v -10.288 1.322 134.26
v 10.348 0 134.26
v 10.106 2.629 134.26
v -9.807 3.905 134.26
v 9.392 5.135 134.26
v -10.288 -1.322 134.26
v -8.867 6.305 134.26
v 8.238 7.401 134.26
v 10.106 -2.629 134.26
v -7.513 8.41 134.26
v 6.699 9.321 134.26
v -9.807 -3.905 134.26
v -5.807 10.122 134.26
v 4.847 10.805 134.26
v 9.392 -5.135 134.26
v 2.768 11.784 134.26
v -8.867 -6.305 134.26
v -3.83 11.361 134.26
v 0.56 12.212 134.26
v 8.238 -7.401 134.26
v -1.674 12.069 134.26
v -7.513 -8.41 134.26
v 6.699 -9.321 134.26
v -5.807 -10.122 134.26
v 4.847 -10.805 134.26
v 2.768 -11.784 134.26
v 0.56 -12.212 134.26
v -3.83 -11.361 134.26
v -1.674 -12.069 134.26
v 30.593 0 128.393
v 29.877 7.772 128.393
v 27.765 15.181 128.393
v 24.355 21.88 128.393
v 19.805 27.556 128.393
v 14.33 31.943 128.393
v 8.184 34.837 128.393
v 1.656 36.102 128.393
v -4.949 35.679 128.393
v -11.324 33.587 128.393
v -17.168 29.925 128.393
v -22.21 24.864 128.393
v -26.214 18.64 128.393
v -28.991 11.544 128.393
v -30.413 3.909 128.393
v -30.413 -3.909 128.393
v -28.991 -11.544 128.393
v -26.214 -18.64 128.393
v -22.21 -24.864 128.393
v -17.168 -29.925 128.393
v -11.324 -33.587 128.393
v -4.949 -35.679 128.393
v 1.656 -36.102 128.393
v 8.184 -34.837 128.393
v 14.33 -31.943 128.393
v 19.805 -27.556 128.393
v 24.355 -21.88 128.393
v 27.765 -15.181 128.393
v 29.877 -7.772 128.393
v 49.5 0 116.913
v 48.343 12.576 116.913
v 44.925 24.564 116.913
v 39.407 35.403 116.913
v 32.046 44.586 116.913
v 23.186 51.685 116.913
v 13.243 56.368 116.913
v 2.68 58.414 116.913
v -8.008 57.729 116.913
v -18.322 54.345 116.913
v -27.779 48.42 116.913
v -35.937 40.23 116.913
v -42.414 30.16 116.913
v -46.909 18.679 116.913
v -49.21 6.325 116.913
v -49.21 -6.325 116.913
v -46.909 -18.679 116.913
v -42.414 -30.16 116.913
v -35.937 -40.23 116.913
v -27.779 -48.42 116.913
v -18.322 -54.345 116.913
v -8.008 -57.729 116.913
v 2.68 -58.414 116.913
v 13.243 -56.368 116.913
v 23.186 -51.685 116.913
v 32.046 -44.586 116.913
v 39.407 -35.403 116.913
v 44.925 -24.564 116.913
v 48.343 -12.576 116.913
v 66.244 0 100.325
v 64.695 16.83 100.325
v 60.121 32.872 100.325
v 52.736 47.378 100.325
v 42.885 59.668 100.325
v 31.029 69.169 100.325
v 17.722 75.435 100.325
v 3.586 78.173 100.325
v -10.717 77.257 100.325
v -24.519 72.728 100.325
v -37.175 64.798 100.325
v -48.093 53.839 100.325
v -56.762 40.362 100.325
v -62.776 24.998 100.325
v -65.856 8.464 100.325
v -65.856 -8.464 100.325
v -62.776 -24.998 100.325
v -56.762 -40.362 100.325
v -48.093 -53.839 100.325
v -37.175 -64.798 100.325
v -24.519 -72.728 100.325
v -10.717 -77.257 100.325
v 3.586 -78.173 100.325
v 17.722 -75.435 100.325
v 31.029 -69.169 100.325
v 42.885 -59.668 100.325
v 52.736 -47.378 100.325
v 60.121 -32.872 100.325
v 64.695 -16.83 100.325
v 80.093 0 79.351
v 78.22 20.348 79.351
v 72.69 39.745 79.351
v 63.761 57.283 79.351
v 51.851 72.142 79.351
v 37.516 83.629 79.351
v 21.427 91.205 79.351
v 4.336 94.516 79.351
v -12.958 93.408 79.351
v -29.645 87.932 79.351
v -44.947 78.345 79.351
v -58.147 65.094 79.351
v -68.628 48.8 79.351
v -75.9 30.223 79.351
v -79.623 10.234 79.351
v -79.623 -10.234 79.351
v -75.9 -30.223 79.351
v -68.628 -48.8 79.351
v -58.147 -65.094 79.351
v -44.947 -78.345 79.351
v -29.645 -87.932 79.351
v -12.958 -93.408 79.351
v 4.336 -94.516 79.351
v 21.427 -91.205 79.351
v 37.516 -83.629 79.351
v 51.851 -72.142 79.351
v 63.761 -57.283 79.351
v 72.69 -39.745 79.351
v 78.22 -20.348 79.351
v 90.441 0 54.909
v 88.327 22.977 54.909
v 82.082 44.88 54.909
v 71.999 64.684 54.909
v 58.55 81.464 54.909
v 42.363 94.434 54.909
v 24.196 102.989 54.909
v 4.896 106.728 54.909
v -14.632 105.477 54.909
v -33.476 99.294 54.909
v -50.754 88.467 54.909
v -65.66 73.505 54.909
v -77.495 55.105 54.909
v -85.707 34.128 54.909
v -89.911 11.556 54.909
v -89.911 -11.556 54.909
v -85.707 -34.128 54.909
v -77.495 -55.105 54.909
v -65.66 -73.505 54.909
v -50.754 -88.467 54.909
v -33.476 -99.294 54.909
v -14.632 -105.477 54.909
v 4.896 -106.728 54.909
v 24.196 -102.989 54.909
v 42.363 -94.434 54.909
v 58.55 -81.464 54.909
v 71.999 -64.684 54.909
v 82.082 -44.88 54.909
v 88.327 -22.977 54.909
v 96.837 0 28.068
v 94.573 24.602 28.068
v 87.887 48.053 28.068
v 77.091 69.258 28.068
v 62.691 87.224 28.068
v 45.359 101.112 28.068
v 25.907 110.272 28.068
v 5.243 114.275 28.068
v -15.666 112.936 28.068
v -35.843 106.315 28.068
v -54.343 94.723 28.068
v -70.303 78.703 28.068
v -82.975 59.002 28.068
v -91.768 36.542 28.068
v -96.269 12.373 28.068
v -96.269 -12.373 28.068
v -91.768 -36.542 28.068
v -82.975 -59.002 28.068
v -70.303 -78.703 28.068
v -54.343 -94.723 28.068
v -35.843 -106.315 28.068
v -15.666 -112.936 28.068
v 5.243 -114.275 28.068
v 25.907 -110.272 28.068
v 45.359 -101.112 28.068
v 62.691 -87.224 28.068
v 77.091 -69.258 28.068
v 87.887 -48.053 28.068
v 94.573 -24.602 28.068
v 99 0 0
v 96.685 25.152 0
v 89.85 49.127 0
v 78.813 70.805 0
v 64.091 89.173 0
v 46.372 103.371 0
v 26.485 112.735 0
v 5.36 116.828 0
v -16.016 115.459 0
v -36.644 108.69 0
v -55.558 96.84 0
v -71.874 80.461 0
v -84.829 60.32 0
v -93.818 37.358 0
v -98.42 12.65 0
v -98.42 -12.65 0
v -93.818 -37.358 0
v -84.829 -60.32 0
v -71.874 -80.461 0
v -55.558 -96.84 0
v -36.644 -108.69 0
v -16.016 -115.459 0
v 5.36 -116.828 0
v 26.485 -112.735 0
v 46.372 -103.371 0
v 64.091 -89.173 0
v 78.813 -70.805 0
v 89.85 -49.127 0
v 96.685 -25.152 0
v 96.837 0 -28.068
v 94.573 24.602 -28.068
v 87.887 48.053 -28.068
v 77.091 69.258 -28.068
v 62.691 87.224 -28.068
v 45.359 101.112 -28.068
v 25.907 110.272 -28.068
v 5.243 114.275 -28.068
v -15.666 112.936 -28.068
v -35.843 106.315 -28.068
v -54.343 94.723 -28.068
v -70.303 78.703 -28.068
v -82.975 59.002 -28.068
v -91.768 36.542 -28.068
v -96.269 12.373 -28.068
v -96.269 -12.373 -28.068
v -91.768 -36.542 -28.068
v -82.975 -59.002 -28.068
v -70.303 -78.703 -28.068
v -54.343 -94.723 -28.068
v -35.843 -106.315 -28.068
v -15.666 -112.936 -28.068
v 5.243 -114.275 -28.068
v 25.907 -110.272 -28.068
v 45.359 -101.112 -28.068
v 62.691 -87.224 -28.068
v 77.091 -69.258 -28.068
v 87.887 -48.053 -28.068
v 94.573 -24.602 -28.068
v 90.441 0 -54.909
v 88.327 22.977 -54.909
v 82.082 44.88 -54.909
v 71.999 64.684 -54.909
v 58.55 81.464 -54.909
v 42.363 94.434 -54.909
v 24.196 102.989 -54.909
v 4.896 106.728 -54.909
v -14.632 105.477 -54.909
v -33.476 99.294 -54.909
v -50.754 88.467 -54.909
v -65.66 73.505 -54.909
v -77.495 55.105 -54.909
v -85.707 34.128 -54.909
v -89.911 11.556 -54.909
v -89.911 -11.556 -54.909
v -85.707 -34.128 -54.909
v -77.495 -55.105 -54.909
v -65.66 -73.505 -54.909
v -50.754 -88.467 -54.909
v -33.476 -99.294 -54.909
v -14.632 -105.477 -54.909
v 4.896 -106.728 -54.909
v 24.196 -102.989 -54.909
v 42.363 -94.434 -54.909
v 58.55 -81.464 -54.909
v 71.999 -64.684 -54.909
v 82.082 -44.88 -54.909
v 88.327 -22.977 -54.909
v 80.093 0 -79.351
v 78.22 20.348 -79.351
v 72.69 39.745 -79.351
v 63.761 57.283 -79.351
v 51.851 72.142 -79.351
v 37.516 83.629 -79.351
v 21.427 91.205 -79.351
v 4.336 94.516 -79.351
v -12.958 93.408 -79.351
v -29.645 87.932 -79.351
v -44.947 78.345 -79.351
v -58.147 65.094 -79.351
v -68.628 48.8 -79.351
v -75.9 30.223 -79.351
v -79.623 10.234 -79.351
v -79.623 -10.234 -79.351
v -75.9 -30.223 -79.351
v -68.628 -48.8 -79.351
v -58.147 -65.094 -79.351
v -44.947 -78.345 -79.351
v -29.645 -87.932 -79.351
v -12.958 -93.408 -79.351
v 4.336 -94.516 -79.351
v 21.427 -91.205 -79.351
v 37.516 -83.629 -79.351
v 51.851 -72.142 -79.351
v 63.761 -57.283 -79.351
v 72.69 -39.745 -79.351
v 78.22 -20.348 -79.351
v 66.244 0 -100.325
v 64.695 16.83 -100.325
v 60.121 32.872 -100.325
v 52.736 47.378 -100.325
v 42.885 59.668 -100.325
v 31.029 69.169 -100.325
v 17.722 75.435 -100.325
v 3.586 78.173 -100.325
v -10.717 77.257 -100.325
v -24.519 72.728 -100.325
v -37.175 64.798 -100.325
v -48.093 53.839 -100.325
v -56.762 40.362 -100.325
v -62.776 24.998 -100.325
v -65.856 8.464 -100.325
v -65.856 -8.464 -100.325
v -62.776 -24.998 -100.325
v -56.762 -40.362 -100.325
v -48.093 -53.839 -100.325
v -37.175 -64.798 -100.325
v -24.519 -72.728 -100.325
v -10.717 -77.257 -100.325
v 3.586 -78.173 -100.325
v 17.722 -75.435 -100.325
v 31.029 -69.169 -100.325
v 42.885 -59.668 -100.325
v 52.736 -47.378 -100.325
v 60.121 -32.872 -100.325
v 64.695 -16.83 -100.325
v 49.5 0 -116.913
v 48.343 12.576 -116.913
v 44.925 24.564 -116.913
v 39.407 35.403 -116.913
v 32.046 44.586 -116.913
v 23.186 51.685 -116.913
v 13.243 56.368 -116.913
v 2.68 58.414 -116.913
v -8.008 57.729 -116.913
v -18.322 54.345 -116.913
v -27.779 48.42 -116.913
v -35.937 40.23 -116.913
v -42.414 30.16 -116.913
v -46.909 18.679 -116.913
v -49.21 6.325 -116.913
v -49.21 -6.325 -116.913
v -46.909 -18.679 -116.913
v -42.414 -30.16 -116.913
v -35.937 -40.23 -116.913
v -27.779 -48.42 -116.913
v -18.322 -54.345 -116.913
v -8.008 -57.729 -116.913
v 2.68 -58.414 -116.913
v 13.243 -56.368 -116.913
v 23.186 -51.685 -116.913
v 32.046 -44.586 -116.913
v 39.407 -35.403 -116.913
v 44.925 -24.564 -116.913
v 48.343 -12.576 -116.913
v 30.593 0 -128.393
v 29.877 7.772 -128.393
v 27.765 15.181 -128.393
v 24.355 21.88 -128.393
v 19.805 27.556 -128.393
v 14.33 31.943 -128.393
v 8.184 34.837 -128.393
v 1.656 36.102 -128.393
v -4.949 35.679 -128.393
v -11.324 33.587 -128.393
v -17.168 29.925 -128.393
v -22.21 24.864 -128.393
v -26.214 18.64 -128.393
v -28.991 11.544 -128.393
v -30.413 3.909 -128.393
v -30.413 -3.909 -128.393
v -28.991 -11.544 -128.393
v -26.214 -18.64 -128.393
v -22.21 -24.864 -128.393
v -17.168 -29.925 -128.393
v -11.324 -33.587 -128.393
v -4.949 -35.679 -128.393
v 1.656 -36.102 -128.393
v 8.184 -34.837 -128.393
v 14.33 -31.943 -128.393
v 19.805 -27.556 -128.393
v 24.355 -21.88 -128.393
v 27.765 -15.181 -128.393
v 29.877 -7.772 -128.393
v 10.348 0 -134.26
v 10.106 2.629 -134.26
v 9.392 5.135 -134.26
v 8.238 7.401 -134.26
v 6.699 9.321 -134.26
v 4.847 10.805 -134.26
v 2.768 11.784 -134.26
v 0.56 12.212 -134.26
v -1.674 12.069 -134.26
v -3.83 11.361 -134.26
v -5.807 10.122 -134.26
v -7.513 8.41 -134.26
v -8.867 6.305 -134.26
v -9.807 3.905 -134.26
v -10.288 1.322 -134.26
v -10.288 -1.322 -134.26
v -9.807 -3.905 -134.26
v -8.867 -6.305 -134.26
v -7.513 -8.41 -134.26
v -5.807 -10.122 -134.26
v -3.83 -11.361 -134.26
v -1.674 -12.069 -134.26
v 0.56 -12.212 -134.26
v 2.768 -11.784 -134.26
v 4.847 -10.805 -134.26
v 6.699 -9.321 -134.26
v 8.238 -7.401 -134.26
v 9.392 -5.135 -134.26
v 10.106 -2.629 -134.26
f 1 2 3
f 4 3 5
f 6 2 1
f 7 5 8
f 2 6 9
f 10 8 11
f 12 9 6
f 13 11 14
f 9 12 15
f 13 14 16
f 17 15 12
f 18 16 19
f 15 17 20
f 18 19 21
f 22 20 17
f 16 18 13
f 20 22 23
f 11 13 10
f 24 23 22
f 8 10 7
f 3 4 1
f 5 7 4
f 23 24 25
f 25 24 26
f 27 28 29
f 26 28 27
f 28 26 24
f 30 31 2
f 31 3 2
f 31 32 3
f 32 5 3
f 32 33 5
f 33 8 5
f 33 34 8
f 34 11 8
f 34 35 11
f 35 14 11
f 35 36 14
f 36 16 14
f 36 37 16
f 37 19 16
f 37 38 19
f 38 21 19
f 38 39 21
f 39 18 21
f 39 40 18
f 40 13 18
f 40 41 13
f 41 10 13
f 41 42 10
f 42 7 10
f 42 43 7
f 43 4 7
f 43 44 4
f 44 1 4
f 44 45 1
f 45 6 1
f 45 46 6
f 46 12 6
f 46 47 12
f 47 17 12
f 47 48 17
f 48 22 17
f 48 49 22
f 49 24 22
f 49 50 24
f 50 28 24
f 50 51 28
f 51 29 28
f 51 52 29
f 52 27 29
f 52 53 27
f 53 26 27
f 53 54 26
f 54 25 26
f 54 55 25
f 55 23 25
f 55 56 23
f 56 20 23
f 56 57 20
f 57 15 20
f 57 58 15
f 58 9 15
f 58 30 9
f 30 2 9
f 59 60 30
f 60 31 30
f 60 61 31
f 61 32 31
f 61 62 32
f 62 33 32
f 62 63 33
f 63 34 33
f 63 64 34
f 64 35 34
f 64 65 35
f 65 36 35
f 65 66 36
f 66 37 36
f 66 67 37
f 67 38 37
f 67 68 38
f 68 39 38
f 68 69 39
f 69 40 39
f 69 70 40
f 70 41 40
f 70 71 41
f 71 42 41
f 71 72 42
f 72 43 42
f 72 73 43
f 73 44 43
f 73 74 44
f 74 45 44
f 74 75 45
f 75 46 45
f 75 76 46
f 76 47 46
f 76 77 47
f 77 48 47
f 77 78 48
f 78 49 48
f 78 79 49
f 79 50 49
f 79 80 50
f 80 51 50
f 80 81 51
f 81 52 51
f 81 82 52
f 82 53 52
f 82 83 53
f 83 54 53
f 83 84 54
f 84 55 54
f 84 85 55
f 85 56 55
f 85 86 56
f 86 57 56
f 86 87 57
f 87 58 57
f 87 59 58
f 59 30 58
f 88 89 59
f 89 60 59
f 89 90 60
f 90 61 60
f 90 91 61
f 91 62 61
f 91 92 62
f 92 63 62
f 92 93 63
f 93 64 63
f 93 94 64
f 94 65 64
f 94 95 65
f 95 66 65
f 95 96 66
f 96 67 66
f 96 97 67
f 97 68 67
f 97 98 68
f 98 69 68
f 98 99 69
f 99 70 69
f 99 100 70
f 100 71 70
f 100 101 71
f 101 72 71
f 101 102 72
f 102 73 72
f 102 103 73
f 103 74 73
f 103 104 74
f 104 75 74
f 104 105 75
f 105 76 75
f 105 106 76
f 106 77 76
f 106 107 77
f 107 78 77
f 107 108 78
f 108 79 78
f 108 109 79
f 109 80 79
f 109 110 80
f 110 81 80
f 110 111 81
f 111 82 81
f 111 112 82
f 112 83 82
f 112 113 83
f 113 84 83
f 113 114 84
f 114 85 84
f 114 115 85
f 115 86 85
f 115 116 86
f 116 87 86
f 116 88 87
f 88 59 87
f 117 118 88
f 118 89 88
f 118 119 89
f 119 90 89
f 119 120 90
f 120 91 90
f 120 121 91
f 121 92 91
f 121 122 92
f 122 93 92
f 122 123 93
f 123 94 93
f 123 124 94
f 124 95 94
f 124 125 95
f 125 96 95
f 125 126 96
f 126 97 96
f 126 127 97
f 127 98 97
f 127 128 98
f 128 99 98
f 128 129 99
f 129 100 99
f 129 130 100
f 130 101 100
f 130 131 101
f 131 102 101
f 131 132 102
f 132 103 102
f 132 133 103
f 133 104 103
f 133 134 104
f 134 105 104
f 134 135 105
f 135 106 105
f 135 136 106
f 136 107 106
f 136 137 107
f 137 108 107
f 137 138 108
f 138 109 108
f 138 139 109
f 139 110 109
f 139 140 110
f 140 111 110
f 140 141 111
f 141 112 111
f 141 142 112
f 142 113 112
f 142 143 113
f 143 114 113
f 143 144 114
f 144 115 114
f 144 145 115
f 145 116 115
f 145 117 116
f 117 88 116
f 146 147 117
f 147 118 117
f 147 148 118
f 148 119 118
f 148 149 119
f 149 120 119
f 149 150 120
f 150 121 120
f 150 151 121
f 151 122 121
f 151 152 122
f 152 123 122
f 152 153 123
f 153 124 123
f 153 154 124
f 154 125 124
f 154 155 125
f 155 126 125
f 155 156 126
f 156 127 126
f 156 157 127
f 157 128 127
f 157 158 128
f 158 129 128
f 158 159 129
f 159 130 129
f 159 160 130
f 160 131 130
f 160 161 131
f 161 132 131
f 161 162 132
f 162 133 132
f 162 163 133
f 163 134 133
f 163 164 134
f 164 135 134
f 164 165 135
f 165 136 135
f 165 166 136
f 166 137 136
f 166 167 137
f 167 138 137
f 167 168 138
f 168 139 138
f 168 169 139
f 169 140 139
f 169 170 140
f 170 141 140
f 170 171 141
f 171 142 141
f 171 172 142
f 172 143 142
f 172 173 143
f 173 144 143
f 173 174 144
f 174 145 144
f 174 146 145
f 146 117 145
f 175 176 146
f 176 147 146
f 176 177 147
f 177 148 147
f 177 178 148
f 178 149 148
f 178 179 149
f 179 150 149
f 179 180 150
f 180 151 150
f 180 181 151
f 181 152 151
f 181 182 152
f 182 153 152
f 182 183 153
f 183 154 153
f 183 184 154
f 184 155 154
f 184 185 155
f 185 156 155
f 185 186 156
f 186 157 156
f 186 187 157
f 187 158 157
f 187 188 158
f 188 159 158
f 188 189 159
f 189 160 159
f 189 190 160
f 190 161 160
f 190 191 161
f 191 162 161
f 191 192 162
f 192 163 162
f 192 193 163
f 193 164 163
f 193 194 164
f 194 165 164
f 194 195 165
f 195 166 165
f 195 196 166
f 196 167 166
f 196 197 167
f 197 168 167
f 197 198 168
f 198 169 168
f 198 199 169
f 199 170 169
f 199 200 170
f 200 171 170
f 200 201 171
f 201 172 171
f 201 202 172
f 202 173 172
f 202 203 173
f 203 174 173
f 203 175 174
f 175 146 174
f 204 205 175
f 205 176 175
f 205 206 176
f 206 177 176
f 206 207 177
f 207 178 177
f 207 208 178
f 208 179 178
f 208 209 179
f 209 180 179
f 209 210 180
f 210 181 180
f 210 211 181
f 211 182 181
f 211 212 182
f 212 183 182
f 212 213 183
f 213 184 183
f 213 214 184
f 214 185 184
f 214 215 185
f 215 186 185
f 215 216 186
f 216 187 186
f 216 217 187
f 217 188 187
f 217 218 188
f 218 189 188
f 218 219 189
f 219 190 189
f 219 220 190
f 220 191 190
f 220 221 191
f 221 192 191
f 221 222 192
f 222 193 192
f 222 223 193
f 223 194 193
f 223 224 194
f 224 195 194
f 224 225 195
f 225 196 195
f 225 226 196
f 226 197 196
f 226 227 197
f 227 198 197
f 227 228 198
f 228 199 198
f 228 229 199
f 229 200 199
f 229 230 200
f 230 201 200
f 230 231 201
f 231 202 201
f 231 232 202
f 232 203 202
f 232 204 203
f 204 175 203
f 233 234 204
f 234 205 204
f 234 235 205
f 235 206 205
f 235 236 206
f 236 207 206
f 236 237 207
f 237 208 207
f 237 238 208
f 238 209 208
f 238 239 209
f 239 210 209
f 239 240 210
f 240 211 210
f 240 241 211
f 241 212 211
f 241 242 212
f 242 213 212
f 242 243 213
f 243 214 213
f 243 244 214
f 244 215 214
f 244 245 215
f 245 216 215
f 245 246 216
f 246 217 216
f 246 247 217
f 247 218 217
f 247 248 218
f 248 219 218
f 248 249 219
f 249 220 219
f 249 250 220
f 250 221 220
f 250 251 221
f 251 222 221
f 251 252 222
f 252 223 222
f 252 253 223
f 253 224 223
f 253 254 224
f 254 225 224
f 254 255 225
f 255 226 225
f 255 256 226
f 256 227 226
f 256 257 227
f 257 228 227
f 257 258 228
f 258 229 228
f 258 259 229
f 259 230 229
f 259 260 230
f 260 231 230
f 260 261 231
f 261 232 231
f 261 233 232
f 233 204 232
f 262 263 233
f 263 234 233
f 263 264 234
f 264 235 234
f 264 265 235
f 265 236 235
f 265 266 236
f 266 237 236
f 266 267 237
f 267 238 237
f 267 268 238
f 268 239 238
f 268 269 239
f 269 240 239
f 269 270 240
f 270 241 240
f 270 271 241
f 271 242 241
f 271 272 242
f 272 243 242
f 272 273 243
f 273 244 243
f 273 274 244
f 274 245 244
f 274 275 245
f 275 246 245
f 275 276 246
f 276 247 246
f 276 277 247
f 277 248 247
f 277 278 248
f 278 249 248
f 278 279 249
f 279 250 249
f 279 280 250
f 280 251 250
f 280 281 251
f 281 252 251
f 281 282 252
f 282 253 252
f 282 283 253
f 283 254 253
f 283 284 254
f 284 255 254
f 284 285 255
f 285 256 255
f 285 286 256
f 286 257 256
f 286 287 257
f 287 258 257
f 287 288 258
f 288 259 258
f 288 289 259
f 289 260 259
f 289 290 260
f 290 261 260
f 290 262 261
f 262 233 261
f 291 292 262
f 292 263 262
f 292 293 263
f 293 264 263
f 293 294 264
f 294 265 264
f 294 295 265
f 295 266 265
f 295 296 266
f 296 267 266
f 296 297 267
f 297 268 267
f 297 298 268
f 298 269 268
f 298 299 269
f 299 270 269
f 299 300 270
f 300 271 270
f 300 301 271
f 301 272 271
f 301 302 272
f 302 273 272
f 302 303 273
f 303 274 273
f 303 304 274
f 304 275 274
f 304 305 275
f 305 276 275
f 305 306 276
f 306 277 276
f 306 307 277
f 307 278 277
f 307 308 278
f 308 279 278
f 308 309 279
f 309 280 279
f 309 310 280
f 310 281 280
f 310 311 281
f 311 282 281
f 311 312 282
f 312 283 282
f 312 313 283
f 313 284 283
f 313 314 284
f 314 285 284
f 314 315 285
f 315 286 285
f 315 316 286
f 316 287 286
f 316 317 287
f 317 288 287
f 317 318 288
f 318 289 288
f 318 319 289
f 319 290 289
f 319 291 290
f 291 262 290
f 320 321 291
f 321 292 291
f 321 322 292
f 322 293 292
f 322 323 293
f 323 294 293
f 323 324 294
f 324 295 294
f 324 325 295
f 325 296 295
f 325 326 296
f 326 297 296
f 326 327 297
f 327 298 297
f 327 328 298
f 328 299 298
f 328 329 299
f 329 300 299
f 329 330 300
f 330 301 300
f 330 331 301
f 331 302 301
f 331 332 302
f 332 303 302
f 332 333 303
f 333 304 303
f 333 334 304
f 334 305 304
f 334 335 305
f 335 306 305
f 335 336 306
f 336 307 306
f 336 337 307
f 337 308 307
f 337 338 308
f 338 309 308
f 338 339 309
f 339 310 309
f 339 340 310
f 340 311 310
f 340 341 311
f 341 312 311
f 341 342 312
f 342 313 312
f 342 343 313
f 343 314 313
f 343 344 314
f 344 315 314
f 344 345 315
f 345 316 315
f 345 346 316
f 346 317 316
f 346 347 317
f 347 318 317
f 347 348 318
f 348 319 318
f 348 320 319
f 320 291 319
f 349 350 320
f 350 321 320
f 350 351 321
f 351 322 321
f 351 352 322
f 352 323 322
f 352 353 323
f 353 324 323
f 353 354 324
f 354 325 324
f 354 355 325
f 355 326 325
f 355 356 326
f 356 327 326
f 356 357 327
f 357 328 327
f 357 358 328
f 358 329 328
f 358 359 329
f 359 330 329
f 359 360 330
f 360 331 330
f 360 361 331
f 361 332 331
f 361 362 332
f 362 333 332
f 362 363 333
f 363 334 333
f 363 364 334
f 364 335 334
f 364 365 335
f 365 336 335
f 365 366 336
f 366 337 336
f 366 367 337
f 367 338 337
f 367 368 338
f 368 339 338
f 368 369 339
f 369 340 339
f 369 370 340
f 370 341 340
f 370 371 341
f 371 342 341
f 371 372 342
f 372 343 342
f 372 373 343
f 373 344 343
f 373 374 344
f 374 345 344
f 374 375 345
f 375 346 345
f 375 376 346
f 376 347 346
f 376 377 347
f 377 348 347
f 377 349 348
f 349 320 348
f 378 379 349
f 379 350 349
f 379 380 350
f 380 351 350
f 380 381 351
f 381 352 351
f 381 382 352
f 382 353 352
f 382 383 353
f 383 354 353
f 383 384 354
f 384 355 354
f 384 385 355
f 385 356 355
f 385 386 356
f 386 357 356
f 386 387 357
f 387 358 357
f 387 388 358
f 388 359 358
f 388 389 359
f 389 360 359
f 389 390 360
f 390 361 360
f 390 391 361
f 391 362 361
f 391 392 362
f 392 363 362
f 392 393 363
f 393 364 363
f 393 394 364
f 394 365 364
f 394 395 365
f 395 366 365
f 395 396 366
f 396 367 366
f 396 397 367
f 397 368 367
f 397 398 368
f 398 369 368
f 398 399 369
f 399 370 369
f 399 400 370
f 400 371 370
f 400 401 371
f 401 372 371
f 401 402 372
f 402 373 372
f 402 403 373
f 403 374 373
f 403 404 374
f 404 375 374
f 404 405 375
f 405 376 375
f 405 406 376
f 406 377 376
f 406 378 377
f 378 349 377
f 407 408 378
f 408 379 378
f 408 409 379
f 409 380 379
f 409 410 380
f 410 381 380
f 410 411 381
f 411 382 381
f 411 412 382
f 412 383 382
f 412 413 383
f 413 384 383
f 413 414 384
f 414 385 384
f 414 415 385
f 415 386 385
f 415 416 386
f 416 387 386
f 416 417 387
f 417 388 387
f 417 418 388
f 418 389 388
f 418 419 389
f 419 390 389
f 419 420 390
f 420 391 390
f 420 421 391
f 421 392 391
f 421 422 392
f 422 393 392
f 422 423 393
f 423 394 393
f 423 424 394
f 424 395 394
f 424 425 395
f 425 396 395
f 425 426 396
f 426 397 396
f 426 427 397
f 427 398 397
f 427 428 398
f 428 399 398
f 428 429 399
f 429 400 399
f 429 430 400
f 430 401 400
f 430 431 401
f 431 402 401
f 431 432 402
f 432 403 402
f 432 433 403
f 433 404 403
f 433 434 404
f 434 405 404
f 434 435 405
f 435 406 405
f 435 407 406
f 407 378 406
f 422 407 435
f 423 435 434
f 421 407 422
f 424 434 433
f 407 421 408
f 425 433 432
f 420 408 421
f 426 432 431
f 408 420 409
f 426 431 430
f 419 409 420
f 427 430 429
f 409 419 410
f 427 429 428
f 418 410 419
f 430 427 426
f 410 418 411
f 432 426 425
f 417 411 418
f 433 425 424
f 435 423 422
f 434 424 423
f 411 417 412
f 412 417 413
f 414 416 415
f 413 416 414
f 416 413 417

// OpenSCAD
// Generated by SolidPython 1.0.1 on 2020-07-29 00:46:49


scale(v = [11, 13, 15]) {
	sphere(r = 9);
}
/***********************************************
*********      SolidPython code:      **********
************************************************
 
# import packages: SolidPython
from solid import *
from solid.utils import *
from itertools import chain, combinations, permutations


class Resize:

    def __init__(self, scad_file):
        self.scad_file = scad_file
        #self.scad_file = import_scad(scad_file)
        # cone/cylinder param:
        self.r1 = 0
        self.r2 = 0
        self.h = 0
        # rectangular prism param:
        self.w = 0
        self.l = 0
        # ellipse param:
        self.r = 0

    # import OpenScad code (file name corresponds to shape)


    # classify shape + parameters
    def assign(self, param1, param2, param3):
        if self.scad_file == 'cone.scad':
            self.r1 = param1
            self.r2 = param2
            self.h = param3
        elif self.scad_file == 'cylinder.scad':
            self.r1 = param1
            self.r2 = param2
            self.h = param3
        elif self.scad_file == 'rectangularPrism.scad':
            self.h = param1
            self.l = param2
            self.w = param3
        else:
            self.r = param1
            self.h = param2

    # resize parameters
    def iterate(self):
        x = range(3, 20, 2)
        i = 1
        if self.scad_file == 'cone.scad':
            tempList = list(permutations(x, 2))
            for temp in tempList:
                param1 = temp[0]
                param2 = temp[1]
                filepath = 'produced_scad_files/' + 'cone' + str(param1) + '_' + str(param2) + '_' + '.scad'
                scad_render_to_file(cylinder(h=param1, r1=param2, r2=0), filepath)

        elif self.scad_file == 'cylinder.scad':
            tempList = list(permutations(x, 3))
            for temp in tempList:
                param1 = temp[0]
                param2 = temp[1]
                filepath = 'produced_scad_files/' + 'cylinder' + str(param1) + '_' + str(param2) + '_' + '.scad'
                scad_render_to_file(cylinder(h=param1, r1=param2, r2=param2), filepath)

        elif self.scad_file == 'rectangularPrism.scad':
            tempList = list(permutations(x, 3))
            for temp in tempList:
                param1 = temp[0]
                param2 = temp[1]
                param3 = temp[2]
                filepath = 'produced_scad_files/' + 'rectangularPrism' + str(param1) + '_' + str(param2) + '_' + str(
                    param3) + '.scad'
                scad_render_to_file(cube(size=(param1, param2, param3)), filepath)

        elif self.scad_file == 'ellipse.scad':
            tempList = list(permutations(x, 4))
            for temp in tempList:
                param1 = temp[0]
                param2 = temp[1]
                param3 = temp[2]
                param4 = temp[3]
                filepath = 'produced_scad_files/' + 'ellipse' + str(param1) + '_' + str(param2) + '_' + str(param3) + '_' + str(param4) + '.scad'
                scad_render_to_file(scale([param1, param2, param3])(sphere(r=param4)), filepath)

    def render_to_scadfile(self):
        scad_render_to_file(scad, 'example.scad') 
 
************************************************/
